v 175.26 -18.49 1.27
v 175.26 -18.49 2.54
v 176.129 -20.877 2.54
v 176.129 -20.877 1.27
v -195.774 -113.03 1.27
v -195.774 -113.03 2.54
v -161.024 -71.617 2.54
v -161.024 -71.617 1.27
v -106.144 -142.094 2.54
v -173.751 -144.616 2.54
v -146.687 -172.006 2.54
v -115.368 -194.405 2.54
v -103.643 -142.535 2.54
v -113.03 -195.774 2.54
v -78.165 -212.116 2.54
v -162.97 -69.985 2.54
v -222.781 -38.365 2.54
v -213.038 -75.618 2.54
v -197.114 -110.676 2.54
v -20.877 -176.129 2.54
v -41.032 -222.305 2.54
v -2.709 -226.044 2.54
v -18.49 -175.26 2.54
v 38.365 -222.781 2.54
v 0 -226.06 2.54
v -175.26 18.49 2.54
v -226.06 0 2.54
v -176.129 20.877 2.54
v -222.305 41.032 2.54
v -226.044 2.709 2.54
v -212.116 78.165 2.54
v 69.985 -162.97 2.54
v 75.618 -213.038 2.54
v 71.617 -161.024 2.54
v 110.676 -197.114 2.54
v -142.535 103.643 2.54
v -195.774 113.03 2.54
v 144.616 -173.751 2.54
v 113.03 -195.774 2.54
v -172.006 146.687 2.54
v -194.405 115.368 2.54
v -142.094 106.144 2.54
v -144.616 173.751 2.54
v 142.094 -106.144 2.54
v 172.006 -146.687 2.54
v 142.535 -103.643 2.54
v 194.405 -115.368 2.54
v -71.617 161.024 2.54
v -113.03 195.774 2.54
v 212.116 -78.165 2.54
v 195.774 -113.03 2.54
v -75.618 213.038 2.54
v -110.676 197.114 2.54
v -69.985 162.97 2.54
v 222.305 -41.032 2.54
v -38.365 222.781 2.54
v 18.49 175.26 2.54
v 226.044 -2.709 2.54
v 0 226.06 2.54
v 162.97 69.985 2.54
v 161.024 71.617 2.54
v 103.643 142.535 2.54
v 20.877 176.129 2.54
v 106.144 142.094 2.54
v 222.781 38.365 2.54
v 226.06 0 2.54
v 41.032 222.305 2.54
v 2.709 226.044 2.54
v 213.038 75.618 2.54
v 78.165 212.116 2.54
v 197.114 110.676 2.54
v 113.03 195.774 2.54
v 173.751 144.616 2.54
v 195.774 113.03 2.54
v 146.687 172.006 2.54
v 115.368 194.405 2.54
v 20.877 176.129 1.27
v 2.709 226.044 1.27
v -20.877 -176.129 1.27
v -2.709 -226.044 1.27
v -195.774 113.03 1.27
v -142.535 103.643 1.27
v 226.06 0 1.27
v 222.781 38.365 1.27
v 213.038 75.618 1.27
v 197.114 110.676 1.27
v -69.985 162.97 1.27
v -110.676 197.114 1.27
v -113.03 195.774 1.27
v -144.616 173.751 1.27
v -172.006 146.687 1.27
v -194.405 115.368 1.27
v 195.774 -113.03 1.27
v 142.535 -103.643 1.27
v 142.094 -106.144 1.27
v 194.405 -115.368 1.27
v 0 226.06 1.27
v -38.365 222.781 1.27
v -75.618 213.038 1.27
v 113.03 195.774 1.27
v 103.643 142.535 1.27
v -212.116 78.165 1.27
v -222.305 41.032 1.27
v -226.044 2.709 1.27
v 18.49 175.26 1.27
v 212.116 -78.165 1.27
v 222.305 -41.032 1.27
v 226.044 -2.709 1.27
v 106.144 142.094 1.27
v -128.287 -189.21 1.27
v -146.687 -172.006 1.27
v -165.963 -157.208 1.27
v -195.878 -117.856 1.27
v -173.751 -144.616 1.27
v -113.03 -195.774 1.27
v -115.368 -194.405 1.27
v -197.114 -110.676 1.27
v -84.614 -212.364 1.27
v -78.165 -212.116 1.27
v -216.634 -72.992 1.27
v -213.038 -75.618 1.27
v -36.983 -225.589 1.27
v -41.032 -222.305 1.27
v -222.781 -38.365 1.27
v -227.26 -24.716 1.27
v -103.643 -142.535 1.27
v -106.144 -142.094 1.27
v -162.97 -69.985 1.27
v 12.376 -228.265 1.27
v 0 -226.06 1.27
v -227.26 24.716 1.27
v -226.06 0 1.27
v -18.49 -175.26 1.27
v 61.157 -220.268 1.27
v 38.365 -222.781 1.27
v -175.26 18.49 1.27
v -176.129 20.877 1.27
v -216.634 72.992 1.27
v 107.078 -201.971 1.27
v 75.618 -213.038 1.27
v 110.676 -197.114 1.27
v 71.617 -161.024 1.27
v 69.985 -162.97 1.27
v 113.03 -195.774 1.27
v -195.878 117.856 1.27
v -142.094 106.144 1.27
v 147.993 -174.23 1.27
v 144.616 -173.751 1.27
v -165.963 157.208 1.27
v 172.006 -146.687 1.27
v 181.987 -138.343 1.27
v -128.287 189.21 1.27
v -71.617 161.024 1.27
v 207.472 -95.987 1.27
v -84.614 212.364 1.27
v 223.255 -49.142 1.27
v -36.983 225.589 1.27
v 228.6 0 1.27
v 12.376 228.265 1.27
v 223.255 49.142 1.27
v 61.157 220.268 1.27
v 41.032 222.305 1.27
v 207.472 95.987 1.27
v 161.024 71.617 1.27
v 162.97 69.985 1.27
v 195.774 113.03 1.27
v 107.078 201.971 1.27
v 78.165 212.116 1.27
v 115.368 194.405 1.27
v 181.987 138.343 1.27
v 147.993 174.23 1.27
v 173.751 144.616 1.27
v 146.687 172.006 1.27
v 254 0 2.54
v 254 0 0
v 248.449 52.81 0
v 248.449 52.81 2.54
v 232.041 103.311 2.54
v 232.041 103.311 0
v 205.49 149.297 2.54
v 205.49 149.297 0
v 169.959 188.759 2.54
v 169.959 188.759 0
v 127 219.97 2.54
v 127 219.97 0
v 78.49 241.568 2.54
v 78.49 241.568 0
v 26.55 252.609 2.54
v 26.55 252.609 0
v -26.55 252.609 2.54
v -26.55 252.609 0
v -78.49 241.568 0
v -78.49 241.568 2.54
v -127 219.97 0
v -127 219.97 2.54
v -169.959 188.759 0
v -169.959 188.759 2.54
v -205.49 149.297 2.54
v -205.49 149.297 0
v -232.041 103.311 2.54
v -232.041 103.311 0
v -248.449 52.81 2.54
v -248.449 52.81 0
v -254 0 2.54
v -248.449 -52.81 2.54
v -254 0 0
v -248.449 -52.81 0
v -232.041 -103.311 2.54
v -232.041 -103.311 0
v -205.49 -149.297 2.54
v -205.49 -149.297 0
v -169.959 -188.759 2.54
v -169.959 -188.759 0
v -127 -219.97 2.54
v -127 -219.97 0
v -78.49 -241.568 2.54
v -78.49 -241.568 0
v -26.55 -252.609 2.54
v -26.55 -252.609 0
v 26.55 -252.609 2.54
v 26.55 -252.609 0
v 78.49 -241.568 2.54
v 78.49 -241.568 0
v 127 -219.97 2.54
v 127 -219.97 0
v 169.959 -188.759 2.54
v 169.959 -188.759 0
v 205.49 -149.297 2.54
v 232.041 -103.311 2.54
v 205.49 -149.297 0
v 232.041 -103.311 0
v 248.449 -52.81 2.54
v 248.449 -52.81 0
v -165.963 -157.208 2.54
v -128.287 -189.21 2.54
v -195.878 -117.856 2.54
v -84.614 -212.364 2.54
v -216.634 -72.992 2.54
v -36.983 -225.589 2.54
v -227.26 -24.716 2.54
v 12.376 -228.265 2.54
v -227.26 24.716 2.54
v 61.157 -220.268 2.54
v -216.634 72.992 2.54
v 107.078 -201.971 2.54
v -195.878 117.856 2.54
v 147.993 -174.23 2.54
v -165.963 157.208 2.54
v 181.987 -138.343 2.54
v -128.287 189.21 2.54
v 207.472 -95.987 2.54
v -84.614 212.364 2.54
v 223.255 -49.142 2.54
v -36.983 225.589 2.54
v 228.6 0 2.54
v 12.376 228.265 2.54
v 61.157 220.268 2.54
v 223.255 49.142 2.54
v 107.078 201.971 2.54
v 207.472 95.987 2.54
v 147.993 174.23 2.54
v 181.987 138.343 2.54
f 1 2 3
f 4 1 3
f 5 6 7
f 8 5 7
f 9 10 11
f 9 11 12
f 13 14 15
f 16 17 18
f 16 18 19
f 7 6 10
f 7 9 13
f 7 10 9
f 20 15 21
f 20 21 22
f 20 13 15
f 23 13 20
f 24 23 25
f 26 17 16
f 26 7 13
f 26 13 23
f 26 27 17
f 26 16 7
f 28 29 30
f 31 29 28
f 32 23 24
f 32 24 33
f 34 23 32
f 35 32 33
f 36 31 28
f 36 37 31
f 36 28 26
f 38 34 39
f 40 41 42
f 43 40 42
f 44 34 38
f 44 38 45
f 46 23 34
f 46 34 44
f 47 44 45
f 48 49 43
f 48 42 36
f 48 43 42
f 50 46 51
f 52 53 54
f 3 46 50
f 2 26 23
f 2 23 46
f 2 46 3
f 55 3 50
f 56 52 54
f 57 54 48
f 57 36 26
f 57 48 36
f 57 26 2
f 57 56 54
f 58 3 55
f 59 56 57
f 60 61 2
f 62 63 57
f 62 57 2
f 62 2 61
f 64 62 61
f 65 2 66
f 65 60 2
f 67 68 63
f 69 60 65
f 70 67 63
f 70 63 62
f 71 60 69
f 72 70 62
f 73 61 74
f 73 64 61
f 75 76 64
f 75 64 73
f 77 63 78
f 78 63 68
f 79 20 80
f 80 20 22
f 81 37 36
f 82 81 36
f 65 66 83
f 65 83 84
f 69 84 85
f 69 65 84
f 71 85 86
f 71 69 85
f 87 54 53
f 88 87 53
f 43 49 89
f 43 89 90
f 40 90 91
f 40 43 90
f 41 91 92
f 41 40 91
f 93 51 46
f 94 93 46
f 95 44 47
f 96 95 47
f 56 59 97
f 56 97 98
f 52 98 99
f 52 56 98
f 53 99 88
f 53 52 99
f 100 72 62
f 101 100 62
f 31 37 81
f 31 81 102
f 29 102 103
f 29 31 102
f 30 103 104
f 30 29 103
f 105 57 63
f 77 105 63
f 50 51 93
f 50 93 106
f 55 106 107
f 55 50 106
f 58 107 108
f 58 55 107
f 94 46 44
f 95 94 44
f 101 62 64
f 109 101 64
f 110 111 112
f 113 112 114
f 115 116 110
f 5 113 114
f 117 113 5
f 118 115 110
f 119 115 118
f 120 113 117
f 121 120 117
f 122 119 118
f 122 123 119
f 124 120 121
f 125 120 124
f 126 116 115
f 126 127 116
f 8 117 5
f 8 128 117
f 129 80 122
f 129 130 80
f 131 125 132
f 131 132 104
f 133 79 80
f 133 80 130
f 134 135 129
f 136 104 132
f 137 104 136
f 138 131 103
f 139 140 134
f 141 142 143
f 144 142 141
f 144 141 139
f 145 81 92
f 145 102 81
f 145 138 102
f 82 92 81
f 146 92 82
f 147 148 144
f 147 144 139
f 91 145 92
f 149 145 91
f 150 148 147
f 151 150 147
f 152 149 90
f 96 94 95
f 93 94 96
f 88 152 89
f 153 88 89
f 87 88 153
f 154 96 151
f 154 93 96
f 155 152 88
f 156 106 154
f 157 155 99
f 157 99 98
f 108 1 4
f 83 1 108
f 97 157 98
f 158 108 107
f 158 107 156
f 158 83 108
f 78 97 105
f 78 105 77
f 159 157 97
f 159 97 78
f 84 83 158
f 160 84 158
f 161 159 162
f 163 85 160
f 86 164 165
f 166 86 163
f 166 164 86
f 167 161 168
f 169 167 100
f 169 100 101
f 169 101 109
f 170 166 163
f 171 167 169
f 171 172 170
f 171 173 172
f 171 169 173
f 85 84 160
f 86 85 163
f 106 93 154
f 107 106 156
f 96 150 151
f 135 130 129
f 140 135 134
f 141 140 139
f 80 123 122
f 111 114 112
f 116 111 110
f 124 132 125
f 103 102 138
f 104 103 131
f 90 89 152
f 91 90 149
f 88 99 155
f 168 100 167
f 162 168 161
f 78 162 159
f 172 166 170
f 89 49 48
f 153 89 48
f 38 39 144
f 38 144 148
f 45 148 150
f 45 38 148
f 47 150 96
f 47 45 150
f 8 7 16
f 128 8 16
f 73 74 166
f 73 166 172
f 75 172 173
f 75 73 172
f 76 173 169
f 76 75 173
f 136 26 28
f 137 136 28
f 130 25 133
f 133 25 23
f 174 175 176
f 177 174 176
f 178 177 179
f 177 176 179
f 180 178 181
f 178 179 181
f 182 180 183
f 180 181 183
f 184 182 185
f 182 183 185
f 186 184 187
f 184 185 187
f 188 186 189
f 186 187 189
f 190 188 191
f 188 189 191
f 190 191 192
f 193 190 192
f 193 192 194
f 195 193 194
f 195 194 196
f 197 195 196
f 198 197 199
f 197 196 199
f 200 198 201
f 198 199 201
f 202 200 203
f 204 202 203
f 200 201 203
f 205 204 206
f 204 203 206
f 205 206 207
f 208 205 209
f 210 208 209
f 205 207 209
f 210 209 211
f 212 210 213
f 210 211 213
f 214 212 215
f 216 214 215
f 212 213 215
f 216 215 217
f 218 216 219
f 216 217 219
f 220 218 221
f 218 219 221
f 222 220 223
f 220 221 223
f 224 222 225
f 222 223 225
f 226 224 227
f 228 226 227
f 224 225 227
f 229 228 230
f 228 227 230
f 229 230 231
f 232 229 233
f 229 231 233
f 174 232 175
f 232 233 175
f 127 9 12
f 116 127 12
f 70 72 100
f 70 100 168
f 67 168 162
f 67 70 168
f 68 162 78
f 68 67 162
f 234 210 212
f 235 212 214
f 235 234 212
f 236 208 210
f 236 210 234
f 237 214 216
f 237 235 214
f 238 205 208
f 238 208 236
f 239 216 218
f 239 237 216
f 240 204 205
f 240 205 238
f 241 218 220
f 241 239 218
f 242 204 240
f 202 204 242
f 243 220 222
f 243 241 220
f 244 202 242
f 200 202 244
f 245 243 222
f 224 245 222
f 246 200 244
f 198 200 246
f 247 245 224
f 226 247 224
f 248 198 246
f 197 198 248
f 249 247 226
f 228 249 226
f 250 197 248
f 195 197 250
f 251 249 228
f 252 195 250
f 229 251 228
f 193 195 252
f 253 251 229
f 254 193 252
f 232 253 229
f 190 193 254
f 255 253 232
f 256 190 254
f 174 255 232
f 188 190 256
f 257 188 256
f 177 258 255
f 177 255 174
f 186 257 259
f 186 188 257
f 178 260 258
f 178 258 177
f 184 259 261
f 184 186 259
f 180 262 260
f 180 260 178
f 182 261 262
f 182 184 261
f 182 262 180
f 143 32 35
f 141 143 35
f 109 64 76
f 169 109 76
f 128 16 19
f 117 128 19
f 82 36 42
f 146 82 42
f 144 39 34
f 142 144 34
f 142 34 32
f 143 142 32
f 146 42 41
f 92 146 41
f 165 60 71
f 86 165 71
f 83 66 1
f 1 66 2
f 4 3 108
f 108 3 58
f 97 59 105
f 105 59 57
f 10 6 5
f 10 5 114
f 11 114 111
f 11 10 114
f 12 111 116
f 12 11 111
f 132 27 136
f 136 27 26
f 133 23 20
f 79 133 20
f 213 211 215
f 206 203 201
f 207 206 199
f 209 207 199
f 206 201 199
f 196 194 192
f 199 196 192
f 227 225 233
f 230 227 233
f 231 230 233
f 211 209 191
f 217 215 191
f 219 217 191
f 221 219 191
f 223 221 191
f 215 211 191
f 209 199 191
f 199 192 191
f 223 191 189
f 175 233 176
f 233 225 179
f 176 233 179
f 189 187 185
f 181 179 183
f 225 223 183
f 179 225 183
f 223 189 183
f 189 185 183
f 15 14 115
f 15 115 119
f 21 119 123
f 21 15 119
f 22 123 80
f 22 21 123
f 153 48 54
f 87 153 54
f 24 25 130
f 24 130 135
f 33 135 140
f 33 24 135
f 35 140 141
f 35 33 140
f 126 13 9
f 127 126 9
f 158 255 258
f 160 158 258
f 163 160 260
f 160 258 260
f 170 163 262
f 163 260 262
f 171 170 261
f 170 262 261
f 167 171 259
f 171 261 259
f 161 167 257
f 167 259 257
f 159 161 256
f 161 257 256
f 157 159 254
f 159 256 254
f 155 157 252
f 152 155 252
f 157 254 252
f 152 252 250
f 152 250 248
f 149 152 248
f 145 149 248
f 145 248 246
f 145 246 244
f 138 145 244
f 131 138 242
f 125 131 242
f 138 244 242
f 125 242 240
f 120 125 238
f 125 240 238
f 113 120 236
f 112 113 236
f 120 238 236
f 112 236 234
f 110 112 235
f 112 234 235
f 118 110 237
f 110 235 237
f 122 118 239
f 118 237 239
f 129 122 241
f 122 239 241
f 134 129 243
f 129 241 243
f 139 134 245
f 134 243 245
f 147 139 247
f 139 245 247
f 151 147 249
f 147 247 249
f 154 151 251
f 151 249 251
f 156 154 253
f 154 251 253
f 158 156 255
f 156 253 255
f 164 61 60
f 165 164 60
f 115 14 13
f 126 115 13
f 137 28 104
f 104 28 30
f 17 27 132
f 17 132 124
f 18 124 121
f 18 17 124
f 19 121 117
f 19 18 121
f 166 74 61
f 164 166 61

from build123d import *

# Parameters (mm, degrees)
SKETCH1_R           = 254
BOSS_EXTRUDE1_DEPTH = 2.54
SKETCH2_R           = 228.6
SKETCH2_R_2         = 226.06
CUT_EXTRUDE1_DEPTH  = 1.27
CUT_EXTRUDE2_DEPTH  = 1.27


with BuildPart() as part:
    # Sketch1 → Boss-Extrude1 (new body)
    with BuildSketch(Plane.XY):
        Circle(SKETCH1_R)
    extrude(amount=BOSS_EXTRUDE1_DEPTH)

    # Sketch2 → Cut-Extrude1 (cut)
    with BuildSketch(Plane.XY.offset(2.54)):
        Circle(SKETCH2_R)
        Circle(SKETCH2_R_2, mode=Mode.SUBTRACT)
    extrude(amount=-CUT_EXTRUDE1_DEPTH, mode=Mode.SUBTRACT)

    # Sketch4 → Cut-Extrude2 (cut)
    with BuildSketch(Plane.XY.offset(2.54)):
        with BuildLine():
            Line((-226.06, 0), (-175.26, 18.489687901))
            Line((-175.26, 18.489687901), (-176.128731164, 20.876507158))
            Line((-176.128731164, 20.876507158), (-226.043768674, 2.708919262))
            ThreePointArc((-226.043768674, 2.708919262), (-226.055942132, 1.354483944), (-226.06, 0))
        make_face()
        with BuildLine():
            Line((-195.77370278, 113.03), (-142.534768317, 103.64253943))
            Line((-142.534768317, 103.64253943), (-142.093701946, 106.143951123))
            Line((-142.093701946, 106.143951123), (-194.405186408, 115.367877234))
            ThreePointArc((-194.405186408, 115.367877234), (-195.092946591, 114.200988571), (-195.77370278, 113.03))
        make_face()
        with BuildLine():
            Line((-113.03, 195.77370278), (-71.61746057, 161.024456218))
            Line((-71.61746057, 161.024456218), (-69.984780041, 162.970209103))
            Line((-69.984780041, 162.970209103), (-110.67589144, 197.11410567))
            ThreePointArc((-110.67589144, 197.11410567), (-111.854953561, 196.447430535), (-113.03, 195.77370278))
        make_face()
        with BuildLine():
            Line((0, 226.06), (18.489687901, 175.26))
            Line((18.489687901, 175.26), (20.876507158, 176.128731164))
            Line((20.876507158, 176.128731164), (2.708919262, 226.043768674))
            ThreePointArc((2.708919262, 226.043768674), (1.354483944, 226.055942132), (0, 226.06))
        make_face()
        with BuildLine():
            Line((113.03, 195.77370278), (103.64253943, 142.534768317))
            Line((103.64253943, 142.534768317), (106.143951123, 142.093701946))
            Line((106.143951123, 142.093701946), (115.367877234, 194.405186408))
            ThreePointArc((115.367877234, 194.405186408), (114.200988571, 195.092946591), (113.03, 195.77370278))
        make_face()
        with BuildLine():
            Line((195.77370278, 113.03), (161.024456218, 71.61746057))
            Line((161.024456218, 71.61746057), (162.970209103, 69.984780041))
            Line((162.970209103, 69.984780041), (197.11410567, 110.67589144))
            ThreePointArc((197.11410567, 110.67589144), (196.447430535, 111.854953561), (195.77370278, 113.03))
        make_face()
        with BuildLine():
            Line((226.06, 0), (175.26, -18.489687901))
            Line((175.26, -18.489687901), (176.128731164, -20.876507158))
            Line((176.128731164, -20.876507158), (226.043768674, -2.708919262))
            ThreePointArc((226.043768674, -2.708919262), (226.055942132, -1.354483944), (226.06, 0))
        make_face()
        with BuildLine():
            Line((195.77370278, -113.03), (142.534768317, -103.64253943))
            Line((142.534768317, -103.64253943), (142.093701946, -106.143951123))
            Line((142.093701946, -106.143951123), (194.405186408, -115.367877234))
            ThreePointArc((194.405186408, -115.367877234), (195.092946591, -114.200988571), (195.77370278, -113.03))
        make_face()
        with BuildLine():
            Line((113.03, -195.77370278), (71.61746057, -161.024456218))
            Line((71.61746057, -161.024456218), (69.984780041, -162.970209103))
            Line((69.984780041, -162.970209103), (110.67589144, -197.11410567))
            ThreePointArc((110.67589144, -197.11410567), (111.854953561, -196.447430535), (113.03, -195.77370278))
        make_face()
        with BuildLine():
            Line((0, -226.06), (-18.489687901, -175.26))
            Line((-18.489687901, -175.26), (-20.876507158, -176.128731164))
            Line((-20.876507158, -176.128731164), (-2.708919262, -226.043768674))
            ThreePointArc((-2.708919262, -226.043768674), (-1.354483944, -226.055942132), (0, -226.06))
        make_face()
        with BuildLine():
            Line((-113.03, -195.77370278), (-103.64253943, -142.534768317))
            Line((-103.64253943, -142.534768317), (-106.143951123, -142.093701946))
            Line((-106.143951123, -142.093701946), (-115.367877234, -194.405186408))
            ThreePointArc((-115.367877234, -194.405186408), (-114.200988571, -195.092946591), (-113.03, -195.77370278))
        make_face()
        with BuildLine():
            Line((-195.77370278, -113.03), (-161.024456218, -71.61746057))
            Line((-161.024456218, -71.61746057), (-162.970209103, -69.984780041))
            Line((-162.970209103, -69.984780041), (-197.11410567, -110.67589144))
            ThreePointArc((-197.11410567, -110.67589144), (-196.447430535, -111.854953561), (-195.77370278, -113.03))
        make_face()
    extrude(amount=-CUT_EXTRUDE2_DEPTH, mode=Mode.SUBTRACT)


solid = part.part
